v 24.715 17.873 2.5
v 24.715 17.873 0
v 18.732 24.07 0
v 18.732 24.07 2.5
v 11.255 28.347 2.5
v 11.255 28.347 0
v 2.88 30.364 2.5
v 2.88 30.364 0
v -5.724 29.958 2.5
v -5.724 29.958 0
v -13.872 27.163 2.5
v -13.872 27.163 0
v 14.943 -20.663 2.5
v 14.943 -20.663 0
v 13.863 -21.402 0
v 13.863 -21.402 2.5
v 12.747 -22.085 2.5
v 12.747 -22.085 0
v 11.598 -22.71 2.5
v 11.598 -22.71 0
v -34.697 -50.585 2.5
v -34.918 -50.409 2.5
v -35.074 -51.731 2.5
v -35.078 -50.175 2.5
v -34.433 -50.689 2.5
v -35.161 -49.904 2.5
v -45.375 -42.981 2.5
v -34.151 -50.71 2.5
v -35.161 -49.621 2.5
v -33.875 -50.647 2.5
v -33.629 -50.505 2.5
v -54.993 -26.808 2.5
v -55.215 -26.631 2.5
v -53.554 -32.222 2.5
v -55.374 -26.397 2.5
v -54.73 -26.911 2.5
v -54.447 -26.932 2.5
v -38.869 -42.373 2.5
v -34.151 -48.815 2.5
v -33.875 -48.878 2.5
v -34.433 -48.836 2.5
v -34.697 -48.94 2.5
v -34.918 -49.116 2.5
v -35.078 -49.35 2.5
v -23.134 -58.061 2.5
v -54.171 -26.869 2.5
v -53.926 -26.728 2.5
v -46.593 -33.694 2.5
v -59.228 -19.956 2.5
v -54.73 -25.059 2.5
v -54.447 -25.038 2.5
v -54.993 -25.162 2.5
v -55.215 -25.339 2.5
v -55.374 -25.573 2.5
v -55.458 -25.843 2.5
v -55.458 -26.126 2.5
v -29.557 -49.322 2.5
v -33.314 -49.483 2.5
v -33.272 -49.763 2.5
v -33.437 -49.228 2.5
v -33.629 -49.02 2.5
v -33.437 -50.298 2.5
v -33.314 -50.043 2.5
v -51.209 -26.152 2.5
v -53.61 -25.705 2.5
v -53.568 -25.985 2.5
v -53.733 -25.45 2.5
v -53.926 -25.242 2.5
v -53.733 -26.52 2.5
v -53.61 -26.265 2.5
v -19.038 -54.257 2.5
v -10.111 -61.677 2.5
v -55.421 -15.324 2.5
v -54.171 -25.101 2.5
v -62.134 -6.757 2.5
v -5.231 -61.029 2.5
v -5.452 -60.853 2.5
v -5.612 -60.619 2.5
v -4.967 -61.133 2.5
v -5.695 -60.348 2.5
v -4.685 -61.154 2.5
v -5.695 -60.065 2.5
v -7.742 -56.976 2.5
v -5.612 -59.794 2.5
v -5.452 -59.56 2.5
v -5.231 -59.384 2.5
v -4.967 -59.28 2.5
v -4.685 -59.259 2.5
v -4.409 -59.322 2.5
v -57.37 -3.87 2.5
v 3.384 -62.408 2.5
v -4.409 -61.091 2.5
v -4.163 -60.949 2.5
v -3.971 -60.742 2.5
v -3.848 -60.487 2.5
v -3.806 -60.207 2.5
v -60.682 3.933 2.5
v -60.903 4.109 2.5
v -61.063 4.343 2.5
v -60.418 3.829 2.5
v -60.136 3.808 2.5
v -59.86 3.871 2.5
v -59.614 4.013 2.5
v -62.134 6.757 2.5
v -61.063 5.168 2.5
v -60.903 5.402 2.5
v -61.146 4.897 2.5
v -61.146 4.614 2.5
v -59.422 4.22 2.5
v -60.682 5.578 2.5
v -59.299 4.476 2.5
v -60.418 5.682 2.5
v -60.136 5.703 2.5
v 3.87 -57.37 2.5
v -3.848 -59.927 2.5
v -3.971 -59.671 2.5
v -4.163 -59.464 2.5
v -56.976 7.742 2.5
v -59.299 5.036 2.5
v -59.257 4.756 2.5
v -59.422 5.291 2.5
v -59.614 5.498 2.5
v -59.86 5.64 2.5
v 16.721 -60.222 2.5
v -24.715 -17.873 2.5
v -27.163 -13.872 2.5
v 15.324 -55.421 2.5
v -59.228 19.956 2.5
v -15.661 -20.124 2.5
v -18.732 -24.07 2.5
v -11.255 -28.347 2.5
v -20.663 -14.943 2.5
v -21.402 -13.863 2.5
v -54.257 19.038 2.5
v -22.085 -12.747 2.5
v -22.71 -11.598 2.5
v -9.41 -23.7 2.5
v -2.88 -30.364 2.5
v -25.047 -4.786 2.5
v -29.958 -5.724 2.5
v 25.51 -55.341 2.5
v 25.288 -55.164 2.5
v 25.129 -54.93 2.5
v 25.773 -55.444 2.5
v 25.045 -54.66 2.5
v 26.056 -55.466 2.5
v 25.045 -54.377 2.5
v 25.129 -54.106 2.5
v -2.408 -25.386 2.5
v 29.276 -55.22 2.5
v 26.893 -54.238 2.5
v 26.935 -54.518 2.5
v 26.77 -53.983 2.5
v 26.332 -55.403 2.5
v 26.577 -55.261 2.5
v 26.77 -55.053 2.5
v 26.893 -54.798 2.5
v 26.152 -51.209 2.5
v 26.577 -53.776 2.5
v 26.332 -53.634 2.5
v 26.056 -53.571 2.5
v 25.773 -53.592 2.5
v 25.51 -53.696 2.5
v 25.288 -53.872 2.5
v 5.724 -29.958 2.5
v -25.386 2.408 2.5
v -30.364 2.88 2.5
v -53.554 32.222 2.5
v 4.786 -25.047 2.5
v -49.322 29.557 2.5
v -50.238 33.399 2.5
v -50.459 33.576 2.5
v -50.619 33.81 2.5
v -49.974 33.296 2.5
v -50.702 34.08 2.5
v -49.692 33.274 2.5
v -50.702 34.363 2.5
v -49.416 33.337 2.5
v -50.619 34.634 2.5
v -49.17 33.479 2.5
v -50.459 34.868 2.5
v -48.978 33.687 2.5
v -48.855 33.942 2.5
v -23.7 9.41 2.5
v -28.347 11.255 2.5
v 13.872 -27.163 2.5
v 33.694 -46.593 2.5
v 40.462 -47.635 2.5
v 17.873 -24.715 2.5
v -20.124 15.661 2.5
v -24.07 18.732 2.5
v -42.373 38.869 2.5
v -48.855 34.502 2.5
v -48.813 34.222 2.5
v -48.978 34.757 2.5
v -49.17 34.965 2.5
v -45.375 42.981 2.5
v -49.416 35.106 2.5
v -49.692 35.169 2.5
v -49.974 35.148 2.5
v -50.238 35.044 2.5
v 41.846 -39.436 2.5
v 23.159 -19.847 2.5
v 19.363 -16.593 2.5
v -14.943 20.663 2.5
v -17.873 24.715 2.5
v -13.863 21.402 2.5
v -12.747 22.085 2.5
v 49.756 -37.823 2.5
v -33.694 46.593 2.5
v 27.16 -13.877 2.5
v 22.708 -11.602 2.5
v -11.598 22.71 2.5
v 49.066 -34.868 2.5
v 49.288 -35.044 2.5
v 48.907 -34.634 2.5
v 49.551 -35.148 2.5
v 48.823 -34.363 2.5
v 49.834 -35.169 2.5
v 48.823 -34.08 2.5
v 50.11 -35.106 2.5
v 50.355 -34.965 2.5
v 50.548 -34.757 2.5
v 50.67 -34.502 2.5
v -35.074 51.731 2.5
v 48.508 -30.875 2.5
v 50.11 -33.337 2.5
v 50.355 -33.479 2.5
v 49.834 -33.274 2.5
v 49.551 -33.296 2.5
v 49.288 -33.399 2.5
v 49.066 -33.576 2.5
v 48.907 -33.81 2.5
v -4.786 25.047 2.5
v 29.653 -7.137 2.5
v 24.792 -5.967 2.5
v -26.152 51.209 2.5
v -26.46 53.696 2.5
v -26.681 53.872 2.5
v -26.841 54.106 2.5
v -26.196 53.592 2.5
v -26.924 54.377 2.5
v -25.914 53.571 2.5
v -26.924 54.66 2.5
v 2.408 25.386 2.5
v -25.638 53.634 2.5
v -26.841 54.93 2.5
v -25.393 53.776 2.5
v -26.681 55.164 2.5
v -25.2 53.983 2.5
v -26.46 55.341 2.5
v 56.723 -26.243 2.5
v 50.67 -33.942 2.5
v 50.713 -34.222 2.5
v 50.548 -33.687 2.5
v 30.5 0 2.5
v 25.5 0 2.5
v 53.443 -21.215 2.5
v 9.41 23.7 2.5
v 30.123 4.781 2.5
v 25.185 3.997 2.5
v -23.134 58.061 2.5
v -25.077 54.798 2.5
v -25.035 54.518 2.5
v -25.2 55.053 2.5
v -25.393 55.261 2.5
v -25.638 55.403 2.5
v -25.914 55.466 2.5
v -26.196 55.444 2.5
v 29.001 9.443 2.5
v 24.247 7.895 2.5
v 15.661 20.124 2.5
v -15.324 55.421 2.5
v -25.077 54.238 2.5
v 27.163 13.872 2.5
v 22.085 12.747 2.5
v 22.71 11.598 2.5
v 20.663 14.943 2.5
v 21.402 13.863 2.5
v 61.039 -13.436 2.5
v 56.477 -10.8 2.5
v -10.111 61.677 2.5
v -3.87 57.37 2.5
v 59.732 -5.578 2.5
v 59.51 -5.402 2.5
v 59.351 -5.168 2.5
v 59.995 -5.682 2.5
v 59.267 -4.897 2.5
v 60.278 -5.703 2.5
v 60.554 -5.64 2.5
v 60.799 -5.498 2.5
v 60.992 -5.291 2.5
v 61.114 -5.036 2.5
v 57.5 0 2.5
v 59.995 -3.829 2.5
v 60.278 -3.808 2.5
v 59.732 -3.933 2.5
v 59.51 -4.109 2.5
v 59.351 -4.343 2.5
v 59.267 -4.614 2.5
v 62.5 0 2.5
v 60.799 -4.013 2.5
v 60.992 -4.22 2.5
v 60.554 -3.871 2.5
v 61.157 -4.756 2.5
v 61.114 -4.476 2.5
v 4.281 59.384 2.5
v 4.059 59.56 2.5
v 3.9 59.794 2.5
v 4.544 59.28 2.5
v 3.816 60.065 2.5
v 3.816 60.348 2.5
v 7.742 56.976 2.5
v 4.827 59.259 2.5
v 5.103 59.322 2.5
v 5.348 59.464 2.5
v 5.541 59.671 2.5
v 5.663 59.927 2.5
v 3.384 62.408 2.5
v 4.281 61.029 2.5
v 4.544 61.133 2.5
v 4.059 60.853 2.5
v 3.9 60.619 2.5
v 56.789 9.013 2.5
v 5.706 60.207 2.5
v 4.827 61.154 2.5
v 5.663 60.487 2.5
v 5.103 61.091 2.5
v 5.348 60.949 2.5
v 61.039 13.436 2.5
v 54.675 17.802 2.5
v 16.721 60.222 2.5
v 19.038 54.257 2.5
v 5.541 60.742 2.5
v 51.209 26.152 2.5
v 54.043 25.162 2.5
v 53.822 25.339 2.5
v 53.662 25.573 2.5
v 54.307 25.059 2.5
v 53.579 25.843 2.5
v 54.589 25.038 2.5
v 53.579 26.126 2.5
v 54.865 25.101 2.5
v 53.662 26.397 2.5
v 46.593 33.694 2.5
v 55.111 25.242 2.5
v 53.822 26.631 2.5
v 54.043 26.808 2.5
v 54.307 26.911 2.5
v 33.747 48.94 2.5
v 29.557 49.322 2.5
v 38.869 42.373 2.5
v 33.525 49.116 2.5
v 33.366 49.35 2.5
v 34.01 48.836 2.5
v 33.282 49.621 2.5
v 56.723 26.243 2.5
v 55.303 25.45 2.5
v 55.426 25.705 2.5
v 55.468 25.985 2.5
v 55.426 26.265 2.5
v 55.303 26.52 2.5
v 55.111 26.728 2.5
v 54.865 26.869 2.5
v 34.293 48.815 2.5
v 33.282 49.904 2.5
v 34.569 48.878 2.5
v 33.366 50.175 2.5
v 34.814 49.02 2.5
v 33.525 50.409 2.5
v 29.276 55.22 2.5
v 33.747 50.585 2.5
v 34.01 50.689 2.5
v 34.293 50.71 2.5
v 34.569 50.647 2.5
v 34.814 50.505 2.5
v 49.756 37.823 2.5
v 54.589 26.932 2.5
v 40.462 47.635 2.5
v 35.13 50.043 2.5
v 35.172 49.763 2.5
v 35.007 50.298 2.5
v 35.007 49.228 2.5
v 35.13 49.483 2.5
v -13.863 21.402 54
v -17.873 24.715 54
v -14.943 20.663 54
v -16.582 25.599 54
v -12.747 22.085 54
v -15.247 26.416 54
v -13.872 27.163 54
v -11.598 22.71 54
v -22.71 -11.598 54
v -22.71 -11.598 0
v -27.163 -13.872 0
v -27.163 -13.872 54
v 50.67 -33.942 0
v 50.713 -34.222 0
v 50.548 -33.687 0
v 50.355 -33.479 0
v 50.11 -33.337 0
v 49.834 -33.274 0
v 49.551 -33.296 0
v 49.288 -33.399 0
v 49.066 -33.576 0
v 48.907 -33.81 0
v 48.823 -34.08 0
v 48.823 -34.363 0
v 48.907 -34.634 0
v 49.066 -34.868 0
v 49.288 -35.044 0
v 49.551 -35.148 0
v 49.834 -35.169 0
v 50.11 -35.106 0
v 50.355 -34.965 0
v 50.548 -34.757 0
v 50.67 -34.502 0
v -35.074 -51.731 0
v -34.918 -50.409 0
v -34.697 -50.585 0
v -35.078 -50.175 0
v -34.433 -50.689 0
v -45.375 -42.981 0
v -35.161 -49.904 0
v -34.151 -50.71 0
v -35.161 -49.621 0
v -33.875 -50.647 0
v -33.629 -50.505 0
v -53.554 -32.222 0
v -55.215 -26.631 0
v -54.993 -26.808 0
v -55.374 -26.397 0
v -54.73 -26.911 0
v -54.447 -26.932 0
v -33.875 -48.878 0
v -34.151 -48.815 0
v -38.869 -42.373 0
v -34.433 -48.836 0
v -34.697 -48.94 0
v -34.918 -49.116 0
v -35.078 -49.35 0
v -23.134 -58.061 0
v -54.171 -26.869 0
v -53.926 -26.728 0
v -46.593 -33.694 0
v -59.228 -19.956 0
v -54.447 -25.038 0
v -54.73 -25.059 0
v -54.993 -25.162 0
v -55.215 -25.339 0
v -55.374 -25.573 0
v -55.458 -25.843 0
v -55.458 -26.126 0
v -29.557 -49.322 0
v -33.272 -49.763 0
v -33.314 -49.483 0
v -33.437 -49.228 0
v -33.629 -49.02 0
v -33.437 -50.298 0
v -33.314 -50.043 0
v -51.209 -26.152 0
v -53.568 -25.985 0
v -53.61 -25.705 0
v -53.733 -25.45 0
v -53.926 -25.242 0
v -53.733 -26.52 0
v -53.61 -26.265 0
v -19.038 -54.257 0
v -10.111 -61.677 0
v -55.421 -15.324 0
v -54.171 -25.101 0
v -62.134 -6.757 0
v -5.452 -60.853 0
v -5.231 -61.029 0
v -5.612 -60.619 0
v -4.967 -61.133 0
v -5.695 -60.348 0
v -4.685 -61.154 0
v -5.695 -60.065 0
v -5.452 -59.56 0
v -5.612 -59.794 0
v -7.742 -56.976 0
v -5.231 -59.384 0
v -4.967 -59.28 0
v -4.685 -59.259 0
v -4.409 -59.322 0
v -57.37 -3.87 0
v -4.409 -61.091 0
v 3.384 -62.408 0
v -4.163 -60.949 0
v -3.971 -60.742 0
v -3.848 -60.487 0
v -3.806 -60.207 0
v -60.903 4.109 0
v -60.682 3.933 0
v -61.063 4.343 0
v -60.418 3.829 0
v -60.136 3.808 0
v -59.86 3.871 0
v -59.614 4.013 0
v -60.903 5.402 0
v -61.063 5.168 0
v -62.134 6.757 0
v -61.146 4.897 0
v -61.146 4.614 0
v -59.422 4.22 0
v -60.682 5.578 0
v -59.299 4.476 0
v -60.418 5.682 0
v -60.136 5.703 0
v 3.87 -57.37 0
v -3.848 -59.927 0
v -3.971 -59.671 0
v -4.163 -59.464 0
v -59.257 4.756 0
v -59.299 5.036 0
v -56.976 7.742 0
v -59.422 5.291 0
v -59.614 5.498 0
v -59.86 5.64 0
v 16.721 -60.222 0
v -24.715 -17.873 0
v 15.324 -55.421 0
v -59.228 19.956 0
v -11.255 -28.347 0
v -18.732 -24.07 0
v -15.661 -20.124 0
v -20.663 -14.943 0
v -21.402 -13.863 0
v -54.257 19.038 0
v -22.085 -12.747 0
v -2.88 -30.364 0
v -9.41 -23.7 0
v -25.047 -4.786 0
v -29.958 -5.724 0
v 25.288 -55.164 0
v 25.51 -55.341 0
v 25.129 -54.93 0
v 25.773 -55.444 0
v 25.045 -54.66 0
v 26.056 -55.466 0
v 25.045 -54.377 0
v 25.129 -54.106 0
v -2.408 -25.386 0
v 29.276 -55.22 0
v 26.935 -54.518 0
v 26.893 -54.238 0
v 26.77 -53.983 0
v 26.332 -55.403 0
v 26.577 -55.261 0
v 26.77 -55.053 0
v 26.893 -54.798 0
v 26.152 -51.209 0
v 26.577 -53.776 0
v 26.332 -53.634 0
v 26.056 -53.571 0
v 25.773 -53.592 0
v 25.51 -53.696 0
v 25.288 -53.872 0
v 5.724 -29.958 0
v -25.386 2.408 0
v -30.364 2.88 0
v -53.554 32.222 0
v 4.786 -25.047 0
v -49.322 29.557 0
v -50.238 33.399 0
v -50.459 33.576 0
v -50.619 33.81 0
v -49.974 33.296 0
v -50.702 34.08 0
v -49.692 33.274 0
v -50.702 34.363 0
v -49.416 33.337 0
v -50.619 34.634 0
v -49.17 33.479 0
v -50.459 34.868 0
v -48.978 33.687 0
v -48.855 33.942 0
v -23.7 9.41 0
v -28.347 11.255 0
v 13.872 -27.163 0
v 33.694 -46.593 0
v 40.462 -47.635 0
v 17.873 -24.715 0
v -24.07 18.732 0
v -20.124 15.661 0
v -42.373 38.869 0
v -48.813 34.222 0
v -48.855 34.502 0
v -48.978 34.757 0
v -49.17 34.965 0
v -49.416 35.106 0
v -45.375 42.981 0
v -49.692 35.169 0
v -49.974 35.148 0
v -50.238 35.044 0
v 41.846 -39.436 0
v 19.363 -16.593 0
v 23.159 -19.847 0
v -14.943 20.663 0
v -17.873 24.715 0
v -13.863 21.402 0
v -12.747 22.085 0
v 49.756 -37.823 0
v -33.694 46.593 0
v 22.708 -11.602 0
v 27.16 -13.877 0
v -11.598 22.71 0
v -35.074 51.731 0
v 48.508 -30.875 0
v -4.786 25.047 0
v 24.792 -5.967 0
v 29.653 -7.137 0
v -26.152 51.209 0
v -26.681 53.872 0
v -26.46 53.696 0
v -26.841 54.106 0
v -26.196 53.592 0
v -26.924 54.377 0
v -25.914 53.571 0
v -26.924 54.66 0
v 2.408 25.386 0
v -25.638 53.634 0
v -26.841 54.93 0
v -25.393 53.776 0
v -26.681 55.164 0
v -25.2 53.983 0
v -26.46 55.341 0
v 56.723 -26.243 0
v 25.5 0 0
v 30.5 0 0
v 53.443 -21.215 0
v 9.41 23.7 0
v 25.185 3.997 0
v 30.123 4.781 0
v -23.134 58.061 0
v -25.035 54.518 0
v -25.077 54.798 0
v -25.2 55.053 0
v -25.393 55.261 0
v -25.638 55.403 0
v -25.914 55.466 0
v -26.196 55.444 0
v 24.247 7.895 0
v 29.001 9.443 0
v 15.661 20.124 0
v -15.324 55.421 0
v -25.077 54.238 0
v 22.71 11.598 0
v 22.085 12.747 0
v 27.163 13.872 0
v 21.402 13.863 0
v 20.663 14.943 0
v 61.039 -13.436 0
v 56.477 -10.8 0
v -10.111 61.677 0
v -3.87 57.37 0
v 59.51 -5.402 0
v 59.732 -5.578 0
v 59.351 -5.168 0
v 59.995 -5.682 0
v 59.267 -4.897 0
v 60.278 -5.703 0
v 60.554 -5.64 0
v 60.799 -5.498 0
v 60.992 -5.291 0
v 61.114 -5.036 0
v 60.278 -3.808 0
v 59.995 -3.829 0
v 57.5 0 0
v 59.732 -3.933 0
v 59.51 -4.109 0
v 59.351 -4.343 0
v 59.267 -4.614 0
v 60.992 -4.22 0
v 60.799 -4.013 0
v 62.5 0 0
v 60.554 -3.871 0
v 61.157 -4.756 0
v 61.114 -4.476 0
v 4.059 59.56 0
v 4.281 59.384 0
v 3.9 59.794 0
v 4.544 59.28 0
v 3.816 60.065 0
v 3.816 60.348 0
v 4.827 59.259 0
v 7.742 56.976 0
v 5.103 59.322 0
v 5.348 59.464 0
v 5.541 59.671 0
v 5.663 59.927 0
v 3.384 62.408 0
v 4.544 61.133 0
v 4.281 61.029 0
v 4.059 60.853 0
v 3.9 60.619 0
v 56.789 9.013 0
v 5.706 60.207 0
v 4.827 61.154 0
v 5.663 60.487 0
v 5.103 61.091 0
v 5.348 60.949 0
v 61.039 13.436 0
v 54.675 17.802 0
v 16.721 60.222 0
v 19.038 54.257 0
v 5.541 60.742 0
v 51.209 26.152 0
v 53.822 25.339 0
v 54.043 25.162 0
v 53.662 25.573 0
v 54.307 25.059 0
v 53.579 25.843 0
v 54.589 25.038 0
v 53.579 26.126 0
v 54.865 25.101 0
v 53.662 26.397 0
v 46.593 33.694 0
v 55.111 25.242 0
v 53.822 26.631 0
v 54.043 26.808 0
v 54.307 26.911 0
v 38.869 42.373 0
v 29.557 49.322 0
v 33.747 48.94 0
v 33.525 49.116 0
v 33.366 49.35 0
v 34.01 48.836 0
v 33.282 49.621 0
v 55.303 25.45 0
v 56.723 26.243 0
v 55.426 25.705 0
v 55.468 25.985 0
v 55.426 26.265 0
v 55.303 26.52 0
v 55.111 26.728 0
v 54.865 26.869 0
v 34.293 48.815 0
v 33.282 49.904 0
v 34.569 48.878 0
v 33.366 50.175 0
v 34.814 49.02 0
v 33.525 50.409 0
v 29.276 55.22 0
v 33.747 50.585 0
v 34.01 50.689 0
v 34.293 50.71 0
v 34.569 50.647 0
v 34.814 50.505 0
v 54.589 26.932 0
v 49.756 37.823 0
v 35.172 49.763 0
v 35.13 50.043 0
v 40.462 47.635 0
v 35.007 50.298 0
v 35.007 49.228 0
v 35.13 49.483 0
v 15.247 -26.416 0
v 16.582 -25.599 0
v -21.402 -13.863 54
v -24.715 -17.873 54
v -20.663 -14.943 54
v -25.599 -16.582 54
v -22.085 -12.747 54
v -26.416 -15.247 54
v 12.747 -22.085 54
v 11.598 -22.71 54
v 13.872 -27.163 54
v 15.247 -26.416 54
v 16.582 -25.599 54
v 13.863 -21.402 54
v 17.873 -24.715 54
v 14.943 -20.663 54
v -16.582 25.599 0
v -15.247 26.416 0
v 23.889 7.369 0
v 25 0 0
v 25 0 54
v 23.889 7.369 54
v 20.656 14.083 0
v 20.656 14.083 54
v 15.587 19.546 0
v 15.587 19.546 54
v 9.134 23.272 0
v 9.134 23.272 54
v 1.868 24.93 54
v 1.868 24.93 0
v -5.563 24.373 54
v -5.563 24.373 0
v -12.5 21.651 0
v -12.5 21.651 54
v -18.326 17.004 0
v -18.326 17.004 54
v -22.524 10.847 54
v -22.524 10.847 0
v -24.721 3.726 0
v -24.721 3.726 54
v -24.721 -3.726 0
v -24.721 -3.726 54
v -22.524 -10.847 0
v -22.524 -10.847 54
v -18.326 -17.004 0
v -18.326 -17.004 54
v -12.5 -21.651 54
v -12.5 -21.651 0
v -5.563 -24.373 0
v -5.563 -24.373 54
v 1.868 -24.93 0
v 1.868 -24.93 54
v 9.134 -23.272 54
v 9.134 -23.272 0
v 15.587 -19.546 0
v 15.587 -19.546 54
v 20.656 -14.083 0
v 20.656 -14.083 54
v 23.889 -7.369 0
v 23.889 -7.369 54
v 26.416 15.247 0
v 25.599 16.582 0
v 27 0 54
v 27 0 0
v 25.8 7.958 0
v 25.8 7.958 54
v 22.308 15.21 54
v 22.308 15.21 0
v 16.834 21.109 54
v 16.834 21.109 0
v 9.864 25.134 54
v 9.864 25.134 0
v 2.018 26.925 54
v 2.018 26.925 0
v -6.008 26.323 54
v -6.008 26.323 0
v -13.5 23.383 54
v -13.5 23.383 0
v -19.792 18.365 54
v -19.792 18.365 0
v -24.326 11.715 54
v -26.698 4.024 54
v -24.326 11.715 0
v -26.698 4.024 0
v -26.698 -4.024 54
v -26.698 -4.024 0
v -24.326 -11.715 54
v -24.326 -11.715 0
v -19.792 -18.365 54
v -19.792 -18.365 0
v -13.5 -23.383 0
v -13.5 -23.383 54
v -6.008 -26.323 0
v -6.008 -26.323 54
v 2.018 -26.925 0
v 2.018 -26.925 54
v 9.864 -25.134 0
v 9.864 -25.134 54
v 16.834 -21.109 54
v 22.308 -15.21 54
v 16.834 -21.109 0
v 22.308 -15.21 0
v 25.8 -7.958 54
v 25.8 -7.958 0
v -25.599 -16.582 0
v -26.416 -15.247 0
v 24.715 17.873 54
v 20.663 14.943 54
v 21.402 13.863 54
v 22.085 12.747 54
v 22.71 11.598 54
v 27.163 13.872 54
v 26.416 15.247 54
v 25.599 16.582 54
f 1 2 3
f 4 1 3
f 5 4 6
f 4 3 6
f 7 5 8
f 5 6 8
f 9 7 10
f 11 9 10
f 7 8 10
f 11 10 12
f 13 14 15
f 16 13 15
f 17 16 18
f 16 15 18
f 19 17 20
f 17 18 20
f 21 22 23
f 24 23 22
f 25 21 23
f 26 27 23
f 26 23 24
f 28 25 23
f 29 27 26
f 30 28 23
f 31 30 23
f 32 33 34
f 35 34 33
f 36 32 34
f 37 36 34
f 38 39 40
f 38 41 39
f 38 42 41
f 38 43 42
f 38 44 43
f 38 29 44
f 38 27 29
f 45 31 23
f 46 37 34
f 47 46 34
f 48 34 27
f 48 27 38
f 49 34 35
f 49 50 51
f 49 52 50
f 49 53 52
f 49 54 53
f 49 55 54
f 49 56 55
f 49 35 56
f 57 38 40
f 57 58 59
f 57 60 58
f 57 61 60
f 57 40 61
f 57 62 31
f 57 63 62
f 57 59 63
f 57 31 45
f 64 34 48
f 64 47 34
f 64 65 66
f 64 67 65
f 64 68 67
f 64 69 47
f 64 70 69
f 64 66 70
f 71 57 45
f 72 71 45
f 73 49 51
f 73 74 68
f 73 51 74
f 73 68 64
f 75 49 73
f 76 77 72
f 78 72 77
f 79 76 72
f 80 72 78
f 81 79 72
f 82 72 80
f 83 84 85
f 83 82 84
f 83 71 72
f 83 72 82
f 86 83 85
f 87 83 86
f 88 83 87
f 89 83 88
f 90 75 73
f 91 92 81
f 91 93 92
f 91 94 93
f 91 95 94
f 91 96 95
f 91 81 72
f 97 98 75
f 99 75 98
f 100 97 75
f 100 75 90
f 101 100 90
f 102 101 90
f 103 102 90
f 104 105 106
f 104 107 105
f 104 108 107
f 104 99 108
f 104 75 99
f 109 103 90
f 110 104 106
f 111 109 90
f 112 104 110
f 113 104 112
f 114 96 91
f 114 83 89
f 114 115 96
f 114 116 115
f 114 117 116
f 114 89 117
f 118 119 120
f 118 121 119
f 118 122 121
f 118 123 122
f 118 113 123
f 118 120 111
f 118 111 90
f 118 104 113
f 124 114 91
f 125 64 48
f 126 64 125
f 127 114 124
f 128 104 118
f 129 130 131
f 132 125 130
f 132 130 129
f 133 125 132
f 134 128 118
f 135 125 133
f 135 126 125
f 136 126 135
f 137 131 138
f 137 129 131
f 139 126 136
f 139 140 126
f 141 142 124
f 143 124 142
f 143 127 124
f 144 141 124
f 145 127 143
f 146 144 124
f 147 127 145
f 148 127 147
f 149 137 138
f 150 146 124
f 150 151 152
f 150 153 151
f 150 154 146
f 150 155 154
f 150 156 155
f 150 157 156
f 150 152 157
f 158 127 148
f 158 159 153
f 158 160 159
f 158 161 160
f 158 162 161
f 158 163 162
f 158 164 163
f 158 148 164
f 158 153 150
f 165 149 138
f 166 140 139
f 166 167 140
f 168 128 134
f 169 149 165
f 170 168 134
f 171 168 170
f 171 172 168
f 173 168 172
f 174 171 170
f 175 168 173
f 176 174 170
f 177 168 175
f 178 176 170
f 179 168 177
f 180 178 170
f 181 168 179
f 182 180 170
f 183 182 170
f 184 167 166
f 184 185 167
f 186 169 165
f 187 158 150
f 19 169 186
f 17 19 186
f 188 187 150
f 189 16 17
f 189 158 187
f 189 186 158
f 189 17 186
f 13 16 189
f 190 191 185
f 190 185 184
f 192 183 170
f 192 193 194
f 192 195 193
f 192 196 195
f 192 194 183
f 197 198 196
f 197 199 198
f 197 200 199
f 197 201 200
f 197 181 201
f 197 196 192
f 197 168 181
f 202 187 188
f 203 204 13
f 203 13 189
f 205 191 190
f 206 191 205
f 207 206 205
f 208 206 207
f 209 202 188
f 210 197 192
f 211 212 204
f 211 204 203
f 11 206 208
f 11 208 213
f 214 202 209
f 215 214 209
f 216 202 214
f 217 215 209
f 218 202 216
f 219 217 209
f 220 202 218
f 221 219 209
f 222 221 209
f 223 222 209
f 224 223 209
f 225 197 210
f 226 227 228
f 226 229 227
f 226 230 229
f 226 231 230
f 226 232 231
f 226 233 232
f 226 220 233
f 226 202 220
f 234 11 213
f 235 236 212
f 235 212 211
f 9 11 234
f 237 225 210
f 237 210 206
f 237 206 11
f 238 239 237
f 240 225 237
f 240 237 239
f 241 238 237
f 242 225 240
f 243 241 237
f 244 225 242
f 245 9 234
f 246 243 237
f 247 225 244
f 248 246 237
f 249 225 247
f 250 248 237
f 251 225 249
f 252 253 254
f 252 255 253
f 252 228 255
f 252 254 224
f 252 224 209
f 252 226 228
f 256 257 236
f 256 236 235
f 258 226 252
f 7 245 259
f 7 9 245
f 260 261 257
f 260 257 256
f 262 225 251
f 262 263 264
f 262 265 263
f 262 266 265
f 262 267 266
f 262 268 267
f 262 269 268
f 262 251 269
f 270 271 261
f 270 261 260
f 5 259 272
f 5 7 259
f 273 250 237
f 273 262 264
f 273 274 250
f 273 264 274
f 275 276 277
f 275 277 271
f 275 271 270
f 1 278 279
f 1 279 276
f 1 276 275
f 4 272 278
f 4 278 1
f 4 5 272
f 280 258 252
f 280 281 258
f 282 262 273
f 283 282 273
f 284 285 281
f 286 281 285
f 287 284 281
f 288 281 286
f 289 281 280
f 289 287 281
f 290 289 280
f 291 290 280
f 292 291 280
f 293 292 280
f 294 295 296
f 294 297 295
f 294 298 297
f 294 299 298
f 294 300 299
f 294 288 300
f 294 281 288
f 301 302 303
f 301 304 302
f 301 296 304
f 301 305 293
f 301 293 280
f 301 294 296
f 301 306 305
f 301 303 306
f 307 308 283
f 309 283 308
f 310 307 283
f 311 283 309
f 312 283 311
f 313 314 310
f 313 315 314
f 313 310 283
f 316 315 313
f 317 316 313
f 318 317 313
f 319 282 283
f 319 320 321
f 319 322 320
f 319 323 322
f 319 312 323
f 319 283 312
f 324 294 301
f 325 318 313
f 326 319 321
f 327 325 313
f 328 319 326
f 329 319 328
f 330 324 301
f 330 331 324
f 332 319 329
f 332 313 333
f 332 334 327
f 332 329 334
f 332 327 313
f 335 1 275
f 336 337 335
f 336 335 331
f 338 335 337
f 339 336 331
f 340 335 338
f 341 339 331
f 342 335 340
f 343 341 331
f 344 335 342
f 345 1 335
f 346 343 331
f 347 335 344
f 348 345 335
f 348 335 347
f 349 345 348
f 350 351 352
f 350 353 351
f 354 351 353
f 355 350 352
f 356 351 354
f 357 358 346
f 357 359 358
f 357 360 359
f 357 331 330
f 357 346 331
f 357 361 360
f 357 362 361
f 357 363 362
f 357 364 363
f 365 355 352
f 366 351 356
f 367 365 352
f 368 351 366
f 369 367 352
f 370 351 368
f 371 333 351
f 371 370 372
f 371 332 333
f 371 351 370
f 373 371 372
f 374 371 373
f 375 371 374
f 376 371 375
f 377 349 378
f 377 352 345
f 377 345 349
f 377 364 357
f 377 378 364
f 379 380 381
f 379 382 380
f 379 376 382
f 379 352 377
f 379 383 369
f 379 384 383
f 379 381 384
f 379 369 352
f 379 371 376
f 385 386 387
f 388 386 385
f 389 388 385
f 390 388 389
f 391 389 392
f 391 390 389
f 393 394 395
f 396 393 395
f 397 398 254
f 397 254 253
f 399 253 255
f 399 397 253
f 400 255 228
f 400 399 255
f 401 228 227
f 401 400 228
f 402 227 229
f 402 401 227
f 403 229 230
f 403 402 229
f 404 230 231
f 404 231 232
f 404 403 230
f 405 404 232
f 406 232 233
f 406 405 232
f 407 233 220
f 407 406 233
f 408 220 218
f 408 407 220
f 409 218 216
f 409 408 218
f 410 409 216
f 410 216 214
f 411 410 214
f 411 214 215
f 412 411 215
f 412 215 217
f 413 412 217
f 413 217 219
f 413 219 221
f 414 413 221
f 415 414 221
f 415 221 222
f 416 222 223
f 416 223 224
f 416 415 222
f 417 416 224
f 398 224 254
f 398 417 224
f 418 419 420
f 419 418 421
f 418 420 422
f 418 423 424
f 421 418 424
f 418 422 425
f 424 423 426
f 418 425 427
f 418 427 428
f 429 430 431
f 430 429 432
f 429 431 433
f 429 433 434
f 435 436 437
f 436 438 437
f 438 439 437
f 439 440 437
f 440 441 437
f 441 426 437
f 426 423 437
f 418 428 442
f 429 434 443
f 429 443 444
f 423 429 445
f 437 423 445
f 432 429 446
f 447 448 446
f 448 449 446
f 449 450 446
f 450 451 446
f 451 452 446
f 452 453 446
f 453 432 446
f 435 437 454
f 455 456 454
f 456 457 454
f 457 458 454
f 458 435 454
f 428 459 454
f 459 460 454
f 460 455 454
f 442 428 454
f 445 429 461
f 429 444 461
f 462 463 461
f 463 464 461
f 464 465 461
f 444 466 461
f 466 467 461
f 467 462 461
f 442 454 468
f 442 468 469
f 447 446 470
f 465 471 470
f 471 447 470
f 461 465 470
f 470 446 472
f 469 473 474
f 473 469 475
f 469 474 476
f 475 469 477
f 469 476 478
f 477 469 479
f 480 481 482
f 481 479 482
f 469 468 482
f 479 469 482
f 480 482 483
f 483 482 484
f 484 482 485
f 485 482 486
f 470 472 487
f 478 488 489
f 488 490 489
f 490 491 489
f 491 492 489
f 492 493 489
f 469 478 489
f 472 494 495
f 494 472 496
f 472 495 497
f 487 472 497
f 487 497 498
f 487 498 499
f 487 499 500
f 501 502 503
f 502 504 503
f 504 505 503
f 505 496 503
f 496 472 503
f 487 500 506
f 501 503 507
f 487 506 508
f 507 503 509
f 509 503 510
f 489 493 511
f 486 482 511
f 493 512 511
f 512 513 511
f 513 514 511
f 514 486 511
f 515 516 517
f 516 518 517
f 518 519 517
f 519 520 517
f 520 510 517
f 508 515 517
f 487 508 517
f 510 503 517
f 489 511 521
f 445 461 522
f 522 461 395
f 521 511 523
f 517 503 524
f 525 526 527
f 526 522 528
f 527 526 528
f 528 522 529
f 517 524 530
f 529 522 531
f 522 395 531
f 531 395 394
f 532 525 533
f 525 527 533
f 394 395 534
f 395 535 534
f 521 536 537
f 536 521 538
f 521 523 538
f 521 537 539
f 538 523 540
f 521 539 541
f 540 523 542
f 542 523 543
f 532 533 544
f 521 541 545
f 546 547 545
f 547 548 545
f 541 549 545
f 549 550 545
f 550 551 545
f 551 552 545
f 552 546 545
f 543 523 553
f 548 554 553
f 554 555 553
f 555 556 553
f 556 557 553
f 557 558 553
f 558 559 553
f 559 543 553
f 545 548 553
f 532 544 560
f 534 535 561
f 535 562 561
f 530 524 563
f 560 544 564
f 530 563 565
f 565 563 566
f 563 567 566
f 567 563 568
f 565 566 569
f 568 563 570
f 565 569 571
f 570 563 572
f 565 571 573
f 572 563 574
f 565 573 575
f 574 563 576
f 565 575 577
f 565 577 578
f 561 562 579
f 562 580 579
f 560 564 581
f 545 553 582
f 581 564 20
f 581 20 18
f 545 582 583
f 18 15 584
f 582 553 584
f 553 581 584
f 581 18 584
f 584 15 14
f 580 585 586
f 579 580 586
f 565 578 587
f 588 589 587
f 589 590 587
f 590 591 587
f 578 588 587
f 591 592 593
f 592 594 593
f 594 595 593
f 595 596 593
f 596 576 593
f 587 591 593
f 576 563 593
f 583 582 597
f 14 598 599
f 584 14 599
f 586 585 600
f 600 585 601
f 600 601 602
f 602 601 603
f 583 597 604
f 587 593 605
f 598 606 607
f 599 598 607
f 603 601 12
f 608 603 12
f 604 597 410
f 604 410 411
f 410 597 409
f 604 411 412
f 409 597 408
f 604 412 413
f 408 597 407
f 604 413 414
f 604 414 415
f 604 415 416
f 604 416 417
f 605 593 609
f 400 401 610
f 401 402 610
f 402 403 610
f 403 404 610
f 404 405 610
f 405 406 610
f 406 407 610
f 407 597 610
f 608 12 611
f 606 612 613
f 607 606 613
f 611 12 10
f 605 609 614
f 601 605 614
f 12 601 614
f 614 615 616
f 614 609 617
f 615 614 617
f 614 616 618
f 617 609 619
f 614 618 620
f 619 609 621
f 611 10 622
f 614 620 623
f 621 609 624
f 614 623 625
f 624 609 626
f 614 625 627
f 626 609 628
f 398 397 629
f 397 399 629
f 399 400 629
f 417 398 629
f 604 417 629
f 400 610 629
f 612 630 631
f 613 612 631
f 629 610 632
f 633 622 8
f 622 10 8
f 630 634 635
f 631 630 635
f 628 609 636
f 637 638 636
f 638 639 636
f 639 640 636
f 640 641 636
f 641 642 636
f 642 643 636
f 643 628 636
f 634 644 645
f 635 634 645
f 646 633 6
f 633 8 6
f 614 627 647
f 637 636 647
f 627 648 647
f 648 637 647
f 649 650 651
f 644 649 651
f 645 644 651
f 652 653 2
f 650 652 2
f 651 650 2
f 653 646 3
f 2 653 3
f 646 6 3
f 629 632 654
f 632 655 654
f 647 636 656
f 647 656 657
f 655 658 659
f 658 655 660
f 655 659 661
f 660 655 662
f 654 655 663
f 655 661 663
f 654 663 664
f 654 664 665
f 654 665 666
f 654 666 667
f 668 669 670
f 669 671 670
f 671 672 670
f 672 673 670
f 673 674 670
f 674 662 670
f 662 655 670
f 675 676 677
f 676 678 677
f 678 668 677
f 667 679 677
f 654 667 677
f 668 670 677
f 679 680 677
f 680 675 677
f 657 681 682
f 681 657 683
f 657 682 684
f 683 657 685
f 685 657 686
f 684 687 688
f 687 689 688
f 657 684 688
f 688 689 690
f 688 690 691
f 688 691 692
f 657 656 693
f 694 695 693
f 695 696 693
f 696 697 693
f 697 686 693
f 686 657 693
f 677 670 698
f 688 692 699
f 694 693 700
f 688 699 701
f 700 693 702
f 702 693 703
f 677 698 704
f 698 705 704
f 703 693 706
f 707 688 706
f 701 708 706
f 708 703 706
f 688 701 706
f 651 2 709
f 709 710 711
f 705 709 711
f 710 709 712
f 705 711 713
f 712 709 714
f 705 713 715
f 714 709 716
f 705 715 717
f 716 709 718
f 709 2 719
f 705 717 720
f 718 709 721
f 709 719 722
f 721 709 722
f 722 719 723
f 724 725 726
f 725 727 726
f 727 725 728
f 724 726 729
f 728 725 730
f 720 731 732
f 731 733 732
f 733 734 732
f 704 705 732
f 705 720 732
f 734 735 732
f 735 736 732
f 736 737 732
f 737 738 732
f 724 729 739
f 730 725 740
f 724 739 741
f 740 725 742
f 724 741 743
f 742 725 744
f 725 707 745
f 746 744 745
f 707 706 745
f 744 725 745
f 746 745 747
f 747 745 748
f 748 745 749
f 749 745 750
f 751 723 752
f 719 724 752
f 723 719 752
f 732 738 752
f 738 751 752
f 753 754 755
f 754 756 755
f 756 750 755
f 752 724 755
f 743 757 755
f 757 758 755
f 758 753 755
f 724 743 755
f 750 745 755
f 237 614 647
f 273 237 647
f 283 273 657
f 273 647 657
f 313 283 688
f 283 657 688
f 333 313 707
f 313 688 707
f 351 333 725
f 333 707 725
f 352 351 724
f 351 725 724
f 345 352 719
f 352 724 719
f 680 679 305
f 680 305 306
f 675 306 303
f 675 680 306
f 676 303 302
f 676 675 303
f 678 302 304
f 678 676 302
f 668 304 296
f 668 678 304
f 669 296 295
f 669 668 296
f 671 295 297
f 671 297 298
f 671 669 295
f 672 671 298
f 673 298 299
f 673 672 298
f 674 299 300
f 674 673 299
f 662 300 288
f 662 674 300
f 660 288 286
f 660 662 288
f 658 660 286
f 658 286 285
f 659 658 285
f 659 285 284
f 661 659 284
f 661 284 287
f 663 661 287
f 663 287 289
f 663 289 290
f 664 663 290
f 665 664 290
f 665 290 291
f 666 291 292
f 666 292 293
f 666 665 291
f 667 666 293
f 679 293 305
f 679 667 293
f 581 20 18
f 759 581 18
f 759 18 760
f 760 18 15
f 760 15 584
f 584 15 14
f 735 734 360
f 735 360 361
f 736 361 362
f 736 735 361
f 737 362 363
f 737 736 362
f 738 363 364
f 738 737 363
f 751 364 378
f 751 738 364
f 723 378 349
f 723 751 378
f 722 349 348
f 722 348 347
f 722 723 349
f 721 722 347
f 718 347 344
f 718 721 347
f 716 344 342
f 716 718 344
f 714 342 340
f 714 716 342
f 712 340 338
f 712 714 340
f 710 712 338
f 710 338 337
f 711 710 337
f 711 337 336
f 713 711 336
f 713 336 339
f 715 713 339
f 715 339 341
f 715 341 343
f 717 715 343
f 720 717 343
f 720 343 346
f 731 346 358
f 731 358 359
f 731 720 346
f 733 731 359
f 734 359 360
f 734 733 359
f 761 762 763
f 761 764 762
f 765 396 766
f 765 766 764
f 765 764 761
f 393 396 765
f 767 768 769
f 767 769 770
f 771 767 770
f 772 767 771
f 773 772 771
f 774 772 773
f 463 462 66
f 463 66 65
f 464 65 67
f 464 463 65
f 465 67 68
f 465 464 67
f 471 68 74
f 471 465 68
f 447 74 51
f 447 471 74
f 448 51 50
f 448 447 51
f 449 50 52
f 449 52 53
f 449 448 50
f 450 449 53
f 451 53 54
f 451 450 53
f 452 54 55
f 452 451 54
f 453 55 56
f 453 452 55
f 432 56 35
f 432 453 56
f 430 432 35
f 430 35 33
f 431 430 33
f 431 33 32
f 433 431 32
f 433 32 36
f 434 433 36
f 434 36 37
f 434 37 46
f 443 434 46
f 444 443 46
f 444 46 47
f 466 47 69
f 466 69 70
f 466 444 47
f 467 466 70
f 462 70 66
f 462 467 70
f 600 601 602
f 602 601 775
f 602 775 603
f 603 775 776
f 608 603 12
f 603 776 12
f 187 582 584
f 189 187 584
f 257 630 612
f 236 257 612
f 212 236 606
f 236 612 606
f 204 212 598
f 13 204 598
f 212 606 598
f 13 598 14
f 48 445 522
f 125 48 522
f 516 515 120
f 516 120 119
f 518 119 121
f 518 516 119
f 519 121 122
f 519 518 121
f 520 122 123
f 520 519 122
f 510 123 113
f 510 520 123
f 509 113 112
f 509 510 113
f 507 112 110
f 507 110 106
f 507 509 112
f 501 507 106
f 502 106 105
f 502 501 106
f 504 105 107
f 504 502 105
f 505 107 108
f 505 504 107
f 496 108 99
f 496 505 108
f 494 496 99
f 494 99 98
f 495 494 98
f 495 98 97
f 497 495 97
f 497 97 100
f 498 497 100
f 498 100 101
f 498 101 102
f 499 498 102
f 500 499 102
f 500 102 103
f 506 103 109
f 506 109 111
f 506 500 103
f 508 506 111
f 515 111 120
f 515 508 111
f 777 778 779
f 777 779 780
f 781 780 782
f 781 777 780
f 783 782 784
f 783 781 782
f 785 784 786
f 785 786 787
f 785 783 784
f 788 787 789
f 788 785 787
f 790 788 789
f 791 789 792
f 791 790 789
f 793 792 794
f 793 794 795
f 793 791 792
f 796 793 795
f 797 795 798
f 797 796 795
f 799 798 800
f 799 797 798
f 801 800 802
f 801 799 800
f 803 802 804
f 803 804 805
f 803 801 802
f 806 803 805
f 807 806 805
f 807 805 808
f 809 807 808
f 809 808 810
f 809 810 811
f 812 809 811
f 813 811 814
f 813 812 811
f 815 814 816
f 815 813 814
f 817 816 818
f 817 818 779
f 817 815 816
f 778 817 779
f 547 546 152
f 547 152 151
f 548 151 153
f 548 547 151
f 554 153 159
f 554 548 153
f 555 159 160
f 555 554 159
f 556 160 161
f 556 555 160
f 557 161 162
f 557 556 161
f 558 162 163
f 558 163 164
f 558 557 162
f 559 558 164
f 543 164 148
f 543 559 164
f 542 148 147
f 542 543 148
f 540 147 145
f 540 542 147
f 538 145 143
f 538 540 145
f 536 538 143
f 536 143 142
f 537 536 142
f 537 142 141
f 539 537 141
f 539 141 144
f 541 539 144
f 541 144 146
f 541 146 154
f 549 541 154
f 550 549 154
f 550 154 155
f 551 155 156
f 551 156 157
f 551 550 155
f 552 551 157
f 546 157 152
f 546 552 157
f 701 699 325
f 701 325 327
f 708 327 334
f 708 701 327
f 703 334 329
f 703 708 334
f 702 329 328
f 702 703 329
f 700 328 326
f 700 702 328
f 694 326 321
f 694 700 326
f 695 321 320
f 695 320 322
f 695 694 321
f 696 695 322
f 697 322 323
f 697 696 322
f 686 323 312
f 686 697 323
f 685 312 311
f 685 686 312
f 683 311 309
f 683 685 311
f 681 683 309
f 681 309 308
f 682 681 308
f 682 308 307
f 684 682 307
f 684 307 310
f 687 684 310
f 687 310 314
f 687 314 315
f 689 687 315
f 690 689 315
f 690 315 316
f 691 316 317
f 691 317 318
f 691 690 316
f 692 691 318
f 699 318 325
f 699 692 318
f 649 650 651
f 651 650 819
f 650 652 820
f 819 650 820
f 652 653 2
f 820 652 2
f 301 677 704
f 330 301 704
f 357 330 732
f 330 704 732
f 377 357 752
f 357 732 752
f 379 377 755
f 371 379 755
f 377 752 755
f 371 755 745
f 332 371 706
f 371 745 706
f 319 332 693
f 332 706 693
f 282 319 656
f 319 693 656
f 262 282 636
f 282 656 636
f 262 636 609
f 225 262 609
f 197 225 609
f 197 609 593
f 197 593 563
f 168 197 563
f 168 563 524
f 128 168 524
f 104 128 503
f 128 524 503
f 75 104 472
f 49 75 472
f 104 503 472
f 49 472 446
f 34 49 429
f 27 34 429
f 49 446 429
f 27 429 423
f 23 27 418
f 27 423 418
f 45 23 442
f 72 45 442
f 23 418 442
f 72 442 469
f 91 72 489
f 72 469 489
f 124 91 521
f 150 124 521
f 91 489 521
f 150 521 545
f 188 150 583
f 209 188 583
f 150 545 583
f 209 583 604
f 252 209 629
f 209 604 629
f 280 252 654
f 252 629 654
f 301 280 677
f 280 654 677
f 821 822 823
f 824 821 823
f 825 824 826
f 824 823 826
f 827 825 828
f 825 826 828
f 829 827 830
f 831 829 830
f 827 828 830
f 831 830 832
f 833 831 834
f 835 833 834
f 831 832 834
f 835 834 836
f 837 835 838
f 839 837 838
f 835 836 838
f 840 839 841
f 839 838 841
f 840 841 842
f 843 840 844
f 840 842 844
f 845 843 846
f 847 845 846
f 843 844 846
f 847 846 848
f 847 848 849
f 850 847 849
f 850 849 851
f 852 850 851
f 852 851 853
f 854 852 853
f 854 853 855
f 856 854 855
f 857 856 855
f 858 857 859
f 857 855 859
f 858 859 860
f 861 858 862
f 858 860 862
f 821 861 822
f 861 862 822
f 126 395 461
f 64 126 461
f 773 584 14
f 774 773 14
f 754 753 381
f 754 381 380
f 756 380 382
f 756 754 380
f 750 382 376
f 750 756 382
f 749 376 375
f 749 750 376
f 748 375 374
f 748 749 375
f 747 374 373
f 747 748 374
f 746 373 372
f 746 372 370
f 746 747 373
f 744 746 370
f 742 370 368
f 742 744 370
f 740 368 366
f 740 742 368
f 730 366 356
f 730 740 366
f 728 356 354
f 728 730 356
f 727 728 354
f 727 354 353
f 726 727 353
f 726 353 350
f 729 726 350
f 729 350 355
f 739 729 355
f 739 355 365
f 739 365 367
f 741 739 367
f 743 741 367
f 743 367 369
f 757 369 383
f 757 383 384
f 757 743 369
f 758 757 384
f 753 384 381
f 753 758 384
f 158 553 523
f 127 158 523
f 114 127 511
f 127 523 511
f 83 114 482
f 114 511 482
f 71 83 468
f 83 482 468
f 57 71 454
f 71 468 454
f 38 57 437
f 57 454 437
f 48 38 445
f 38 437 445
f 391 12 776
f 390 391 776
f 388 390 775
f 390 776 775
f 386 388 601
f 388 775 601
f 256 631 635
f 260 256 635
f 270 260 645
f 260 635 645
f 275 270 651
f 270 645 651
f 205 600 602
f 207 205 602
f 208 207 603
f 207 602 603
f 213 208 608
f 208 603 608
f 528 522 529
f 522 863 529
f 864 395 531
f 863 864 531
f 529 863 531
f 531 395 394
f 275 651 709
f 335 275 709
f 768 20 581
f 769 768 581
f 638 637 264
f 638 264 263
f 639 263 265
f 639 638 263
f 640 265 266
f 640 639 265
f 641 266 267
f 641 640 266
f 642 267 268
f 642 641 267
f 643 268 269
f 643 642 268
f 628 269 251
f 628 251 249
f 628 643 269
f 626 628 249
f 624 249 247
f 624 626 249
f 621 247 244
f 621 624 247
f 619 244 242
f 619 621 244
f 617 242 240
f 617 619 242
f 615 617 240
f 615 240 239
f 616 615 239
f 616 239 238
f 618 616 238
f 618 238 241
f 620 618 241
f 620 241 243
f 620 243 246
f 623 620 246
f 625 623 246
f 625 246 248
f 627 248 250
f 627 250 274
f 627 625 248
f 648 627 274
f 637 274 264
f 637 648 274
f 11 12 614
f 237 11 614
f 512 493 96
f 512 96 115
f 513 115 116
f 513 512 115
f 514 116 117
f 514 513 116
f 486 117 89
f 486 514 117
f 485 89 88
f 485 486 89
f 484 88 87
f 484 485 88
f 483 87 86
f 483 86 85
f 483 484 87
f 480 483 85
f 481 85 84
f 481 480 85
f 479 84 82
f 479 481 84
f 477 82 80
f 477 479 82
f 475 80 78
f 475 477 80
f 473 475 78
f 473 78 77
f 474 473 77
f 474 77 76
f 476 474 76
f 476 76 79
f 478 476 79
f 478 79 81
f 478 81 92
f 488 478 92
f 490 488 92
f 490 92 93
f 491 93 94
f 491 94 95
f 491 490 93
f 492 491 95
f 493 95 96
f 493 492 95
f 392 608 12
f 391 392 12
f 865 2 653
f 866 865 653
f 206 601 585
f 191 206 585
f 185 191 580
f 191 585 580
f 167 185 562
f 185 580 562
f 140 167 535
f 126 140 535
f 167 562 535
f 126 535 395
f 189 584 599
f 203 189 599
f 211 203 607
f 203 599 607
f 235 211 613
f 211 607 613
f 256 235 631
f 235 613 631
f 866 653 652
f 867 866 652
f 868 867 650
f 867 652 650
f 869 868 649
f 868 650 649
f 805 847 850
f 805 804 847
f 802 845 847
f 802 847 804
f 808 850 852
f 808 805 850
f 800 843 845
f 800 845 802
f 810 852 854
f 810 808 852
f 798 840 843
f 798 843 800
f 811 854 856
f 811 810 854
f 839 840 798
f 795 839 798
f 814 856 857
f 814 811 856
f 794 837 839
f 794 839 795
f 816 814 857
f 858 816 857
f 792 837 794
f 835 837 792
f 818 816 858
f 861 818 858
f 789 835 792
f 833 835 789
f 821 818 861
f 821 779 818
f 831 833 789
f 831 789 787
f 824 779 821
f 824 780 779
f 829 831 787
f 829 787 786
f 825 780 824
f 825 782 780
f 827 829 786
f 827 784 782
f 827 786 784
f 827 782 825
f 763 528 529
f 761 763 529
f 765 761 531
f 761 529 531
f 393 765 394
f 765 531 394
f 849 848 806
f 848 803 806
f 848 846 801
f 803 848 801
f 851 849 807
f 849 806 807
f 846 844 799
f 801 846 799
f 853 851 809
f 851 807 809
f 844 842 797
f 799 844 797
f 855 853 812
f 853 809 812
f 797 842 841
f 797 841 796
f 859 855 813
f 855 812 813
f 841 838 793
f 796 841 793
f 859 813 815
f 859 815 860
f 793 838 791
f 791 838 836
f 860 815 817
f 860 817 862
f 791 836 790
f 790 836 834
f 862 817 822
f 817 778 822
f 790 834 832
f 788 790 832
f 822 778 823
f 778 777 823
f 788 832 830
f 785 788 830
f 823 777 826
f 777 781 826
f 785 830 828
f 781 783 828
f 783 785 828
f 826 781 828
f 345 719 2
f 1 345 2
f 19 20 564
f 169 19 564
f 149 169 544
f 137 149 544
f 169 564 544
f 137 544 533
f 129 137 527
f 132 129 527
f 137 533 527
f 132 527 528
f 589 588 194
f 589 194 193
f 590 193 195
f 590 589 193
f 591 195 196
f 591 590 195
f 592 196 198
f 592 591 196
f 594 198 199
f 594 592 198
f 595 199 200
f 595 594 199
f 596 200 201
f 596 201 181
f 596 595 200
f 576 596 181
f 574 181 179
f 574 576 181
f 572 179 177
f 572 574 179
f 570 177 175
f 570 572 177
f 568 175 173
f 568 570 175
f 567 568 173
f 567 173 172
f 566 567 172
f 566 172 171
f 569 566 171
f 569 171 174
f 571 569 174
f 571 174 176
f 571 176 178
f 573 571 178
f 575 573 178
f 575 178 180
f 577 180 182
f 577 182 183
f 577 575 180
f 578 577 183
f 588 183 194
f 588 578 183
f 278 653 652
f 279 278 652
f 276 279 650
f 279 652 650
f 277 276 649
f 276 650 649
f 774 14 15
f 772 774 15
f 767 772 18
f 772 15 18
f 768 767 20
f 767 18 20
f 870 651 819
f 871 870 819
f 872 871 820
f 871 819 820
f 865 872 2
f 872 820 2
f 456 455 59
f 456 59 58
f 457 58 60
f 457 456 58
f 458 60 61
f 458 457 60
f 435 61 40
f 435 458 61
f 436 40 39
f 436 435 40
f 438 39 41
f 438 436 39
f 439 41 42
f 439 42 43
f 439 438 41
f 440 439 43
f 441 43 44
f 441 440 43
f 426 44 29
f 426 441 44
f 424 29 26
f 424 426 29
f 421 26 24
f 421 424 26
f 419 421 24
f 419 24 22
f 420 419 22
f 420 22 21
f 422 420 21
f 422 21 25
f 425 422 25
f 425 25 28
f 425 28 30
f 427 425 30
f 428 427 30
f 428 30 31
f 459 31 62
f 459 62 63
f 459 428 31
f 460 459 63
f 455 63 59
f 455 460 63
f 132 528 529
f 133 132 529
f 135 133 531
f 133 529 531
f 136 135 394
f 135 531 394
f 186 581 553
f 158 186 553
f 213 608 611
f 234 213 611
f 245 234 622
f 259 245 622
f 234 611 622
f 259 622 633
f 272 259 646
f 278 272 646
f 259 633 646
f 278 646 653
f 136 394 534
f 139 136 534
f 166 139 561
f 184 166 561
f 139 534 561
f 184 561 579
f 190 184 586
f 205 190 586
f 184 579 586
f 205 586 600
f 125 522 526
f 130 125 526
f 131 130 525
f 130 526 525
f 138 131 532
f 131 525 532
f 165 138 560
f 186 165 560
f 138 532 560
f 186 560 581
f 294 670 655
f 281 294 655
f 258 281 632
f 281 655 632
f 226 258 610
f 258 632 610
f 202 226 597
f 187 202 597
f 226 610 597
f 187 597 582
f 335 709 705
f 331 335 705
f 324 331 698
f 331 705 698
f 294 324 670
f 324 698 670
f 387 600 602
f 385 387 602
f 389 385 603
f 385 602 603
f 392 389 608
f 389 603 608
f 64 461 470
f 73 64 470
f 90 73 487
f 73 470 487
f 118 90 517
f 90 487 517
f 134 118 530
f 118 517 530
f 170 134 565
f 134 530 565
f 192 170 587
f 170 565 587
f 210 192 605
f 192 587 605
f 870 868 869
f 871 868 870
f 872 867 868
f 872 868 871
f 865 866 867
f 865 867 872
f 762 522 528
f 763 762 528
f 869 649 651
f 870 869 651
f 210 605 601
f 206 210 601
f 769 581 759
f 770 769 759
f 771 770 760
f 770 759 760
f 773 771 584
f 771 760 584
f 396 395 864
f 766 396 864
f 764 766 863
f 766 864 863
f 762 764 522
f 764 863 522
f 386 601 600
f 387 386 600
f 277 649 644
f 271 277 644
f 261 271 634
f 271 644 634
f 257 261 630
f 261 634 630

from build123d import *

# Parameters (mm, degrees)
F0_R     = 62.5
F0_R_2   = 0.95
F1_DEPTH = 2.5
F2_DEPTH = 54
F3_R     = 27
F3_R_2   = 25
F4_DEPTH = 54


with BuildPart() as f1:
    # F0 (on Top) → F1 (new body)
    with BuildSketch(Plane.XY):
        Circle(F0_R)
        with Locations((-34.2217646539, -49.7626625001)):
            Circle(F0_R_2, mode=Mode.SUBTRACT)
        with Locations((-4.7555863026, -60.206612212)):
            Circle(F0_R_2, mode=Mode.SUBTRACT)
        with Locations((-54.5182488027, -25.9848475581)):
            Circle(F0_R_2, mode=Mode.SUBTRACT)
        with Locations((25.9848475581, -54.5182488027)):
            Circle(F0_R_2, mode=Mode.SUBTRACT)
        with Locations((49.7626625001, -34.2217646539)):
            Circle(F0_R_2, mode=Mode.SUBTRACT)
        with Locations((60.206612212, -4.7555863026)):
            Circle(F0_R_2, mode=Mode.SUBTRACT)
        with Locations((-60.206612212, 4.7555863026)):
            Circle(F0_R_2, mode=Mode.SUBTRACT)
        with Locations((-49.7626625001, 34.2217646539)):
            Circle(F0_R_2, mode=Mode.SUBTRACT)
        with Locations((-25.9848475581, 54.5182488027)):
            Circle(F0_R_2, mode=Mode.SUBTRACT)
        with BuildLine():
            ThreePointArc((46.5934430221, 33.6942289918), (49.0462021275, 30.0119985484), (51.2085802984, 26.1520802962))
            ThreePointArc((51.2085802984, 26.1520802962), (55.9050237777, 13.4491009521), (57.5, 0))
            ThreePointArc((57.5, 0), (51.2038483272, -26.161343935), (33.6942289918, -46.5934430221))
            ThreePointArc((33.6942289918, -46.5934430221), (30.0119985484, -49.0462021275), (26.1520802962, -51.2085802984))
            ThreePointArc((26.1520802962, -51.2085802984), (-13.4592144253, -55.9025898063), (-46.5934430221, -33.6942289918))
            ThreePointArc((-46.5934430221, -33.6942289918), (-49.0462021275, -30.0119985484), (-51.2085802984, -26.1520802962))
            ThreePointArc((-51.2085802984, -26.1520802962), (-55.9025898063, 13.4592144253), (-33.6942289918, 46.5934430221))
            ThreePointArc((-33.6942289918, 46.5934430221), (-30.0119985484, 49.0462021275), (-26.1520802962, 51.2085802984))
            ThreePointArc((-26.1520802962, 51.2085802984), (13.4592144253, 55.9025898063), (46.5934430221, 33.6942289918))
        make_face(mode=Mode.SUBTRACT)
        with Locations((54.5182488027, 25.9848475581)):
            Circle(F0_R_2, mode=Mode.SUBTRACT)
        with Locations((4.7555863026, 60.206612212)):
            Circle(F0_R_2, mode=Mode.SUBTRACT)
        with Locations((34.2217646539, 49.7626625001)):
            Circle(F0_R_2, mode=Mode.SUBTRACT)
        with BuildLine():
            ThreePointArc((-17.8725910304, 24.7147828204), (-15.9194079257, 26.0158115633), (-13.8719730267, 27.1628121583))
            Line((-13.8719730267, 27.1628121583), (-26.1520802962, 51.2085802984))
            ThreePointArc((-26.1520802962, 51.2085802984), (-30.0119985484, 49.0462021275), (-33.6942289918, 46.5934430221))
            Line((-33.6942289918, 46.5934430221), (-17.8725910304, 24.7147828204))
        make_face()
        with BuildLine():
            ThreePointArc((24.7147828204, 17.8725910304), (26.0158115633, 15.9194079257), (27.1628121583, 13.8719730267))
            Line((27.1628121583, 13.8719730267), (51.2085802984, 26.1520802962))
            ThreePointArc((51.2085802984, 26.1520802962), (49.0462021275, 30.0119985484), (46.5934430221, 33.6942289918))
            Line((46.5934430221, 33.6942289918), (24.7147828204, 17.8725910304))
        make_face()
        with BuildLine():
            Line((-46.5934430221, -33.6942289918), (-24.7147828204, -17.8725910304))
            ThreePointArc((-24.7147828204, -17.8725910304), (-26.0158115633, -15.9194079257), (-27.1628121583, -13.8719730267))
            Line((-27.1628121583, -13.8719730267), (-51.2085802984, -26.1520802962))
            ThreePointArc((-51.2085802984, -26.1520802962), (-49.0462021275, -30.0119985484), (-46.5934430221, -33.6942289918))
        make_face()
        with BuildLine():
            Line((33.6942289918, -46.5934430221), (17.8725910304, -24.7147828204))
            ThreePointArc((17.8725910304, -24.7147828204), (15.9194079257, -26.0158115633), (13.8719730267, -27.1628121583))
            Line((13.8719730267, -27.1628121583), (26.1520802962, -51.2085802984))
            ThreePointArc((26.1520802962, -51.2085802984), (30.0119985484, -49.0462021275), (33.6942289918, -46.5934430221))
        make_face()
        with BuildLine():
            Line((-24.7147828204, -17.8725910304), (-20.6631790793, -14.9426580746))
            ThreePointArc((-20.6631790793, -14.9426580746), (-21.7509244218, -13.3096689215), (-22.7098921323, -11.5978790879))
            Line((-22.7098921323, -11.5978790879), (-27.1628121583, -13.8719730267))
            ThreePointArc((-27.1628121583, -13.8719730267), (-26.0158115633, -15.9194079257), (-24.7147828204, -17.8725910304))
        make_face()
        with BuildLine():
            ThreePointArc((-22.7098921323, -11.5978790879), (-24.7915833054, 5.968869006), (-14.9426580746, 20.6631790793))
            Line((-14.9426580746, 20.6631790793), (-17.8725910304, 24.7147828204))
            ThreePointArc((-17.8725910304, 24.7147828204), (-29.6526780712, 7.1392354778), (-27.1628121583, -13.8719730267))
            Line((-27.1628121583, -13.8719730267), (-22.7098921323, -11.5978790879))
        make_face()
        with BuildLine():
            ThreePointArc((22.7098921323, 11.5978790879), (24.7926627188, 5.9643839005), (25.5, 0))
            ThreePointArc((25.5, 0), (22.707793606, -11.6019873103), (14.9426580746, -20.6631790793))
            Line((14.9426580746, -20.6631790793), (17.8725910304, -24.7147828204))
            ThreePointArc((17.8725910304, -24.7147828204), (27.1603021562, -13.8768867829), (30.5, 0))
            ThreePointArc((30.5, 0), (29.6539691342, 7.1338709398), (27.1628121583, 13.8719730267))
            Line((27.1628121583, 13.8719730267), (22.7098921323, 11.5978790879))
        make_face()
        with BuildLine():
            Line((17.8725910304, -24.7147828204), (14.9426580746, -20.6631790793))
            ThreePointArc((14.9426580746, -20.6631790793), (13.3096689215, -21.7509244218), (11.5978790879, -22.7098921323))
            Line((11.5978790879, -22.7098921323), (13.8719730267, -27.1628121583))
            ThreePointArc((13.8719730267, -27.1628121583), (15.9194079257, -26.0158115633), (17.8725910304, -24.7147828204))
        make_face()
        with BuildLine():
            ThreePointArc((20.6631790793, 14.9426580746), (21.7509244218, 13.3096689215), (22.7098921323, 11.5978790879))
            Line((22.7098921323, 11.5978790879), (27.1628121583, 13.8719730267))
            ThreePointArc((27.1628121583, 13.8719730267), (26.0158115633, 15.9194079257), (24.7147828204, 17.8725910304))
            Line((24.7147828204, 17.8725910304), (20.6631790793, 14.9426580746))
        make_face()
        with BuildLine():
            ThreePointArc((-11.5978790879, 22.7098921323), (5.968869006, 24.7915833054), (20.6631790793, 14.9426580746))
            Line((20.6631790793, 14.9426580746), (24.7147828204, 17.8725910304))
            ThreePointArc((24.7147828204, 17.8725910304), (7.1392354778, 29.6526780712), (-13.8719730267, 27.1628121583))
            Line((-13.8719730267, 27.1628121583), (-11.5978790879, 22.7098921323))
        make_face()
        with BuildLine():
            ThreePointArc((-14.9426580746, 20.6631790793), (-13.3096689215, 21.7509244218), (-11.5978790879, 22.7098921323))
            Line((-11.5978790879, 22.7098921323), (-13.8719730267, 27.1628121583))
            ThreePointArc((-13.8719730267, 27.1628121583), (-15.9194079257, 26.0158115633), (-17.8725910304, 24.7147828204))
            Line((-17.8725910304, 24.7147828204), (-14.9426580746, 20.6631790793))
        make_face()
        with BuildLine():
            Line((13.8719730267, -27.1628121583), (11.5978790879, -22.7098921323))
            ThreePointArc((11.5978790879, -22.7098921323), (-5.968869006, -24.7915833054), (-20.6631790793, -14.9426580746))
            Line((-20.6631790793, -14.9426580746), (-24.7147828204, -17.8725910304))
            ThreePointArc((-24.7147828204, -17.8725910304), (-7.1392354778, -29.6526780712), (13.8719730267, -27.1628121583))
        make_face()
    extrude(amount=F1_DEPTH)


with BuildPart() as f2:
    # F0 (on Top) → F2 (new body)
    with BuildSketch(Plane.XY):
        with BuildLine():
            ThreePointArc((-14.9426580746, 20.6631790793), (-13.3096689215, 21.7509244218), (-11.5978790879, 22.7098921323))
            Line((-11.5978790879, 22.7098921323), (-13.8719730267, 27.1628121583))
            ThreePointArc((-13.8719730267, 27.1628121583), (-15.9194079257, 26.0158115633), (-17.8725910304, 24.7147828204))
            Line((-17.8725910304, 24.7147828204), (-14.9426580746, 20.6631790793))
        make_face()
    extrude(amount=F2_DEPTH)


with BuildPart() as f2b:
    # F0 (on Top) → F2, piece 2 (new body)
    with BuildSketch(Plane.XY):
        with BuildLine():
            ThreePointArc((20.6631790793, 14.9426580746), (21.7509244218, 13.3096689215), (22.7098921323, 11.5978790879))
            Line((22.7098921323, 11.5978790879), (27.1628121583, 13.8719730267))
            ThreePointArc((27.1628121583, 13.8719730267), (26.0158115633, 15.9194079257), (24.7147828204, 17.8725910304))
            Line((24.7147828204, 17.8725910304), (20.6631790793, 14.9426580746))
        make_face()
    extrude(amount=F2_DEPTH)


with BuildPart() as f2c:
    # F0 (on Top) → F2, piece 3 (new body)
    with BuildSketch(Plane.XY):
        with BuildLine():
            Line((-24.7147828204, -17.8725910304), (-20.6631790793, -14.9426580746))
            ThreePointArc((-20.6631790793, -14.9426580746), (-21.7509244218, -13.3096689215), (-22.7098921323, -11.5978790879))
            Line((-22.7098921323, -11.5978790879), (-27.1628121583, -13.8719730267))
            ThreePointArc((-27.1628121583, -13.8719730267), (-26.0158115633, -15.9194079257), (-24.7147828204, -17.8725910304))
        make_face()
    extrude(amount=F2_DEPTH)


with BuildPart() as f2d:
    # F0 (on Top) → F2, piece 4 (new body)
    with BuildSketch(Plane.XY):
        with BuildLine():
            Line((17.8725910304, -24.7147828204), (14.9426580746, -20.6631790793))
            ThreePointArc((14.9426580746, -20.6631790793), (13.3096689215, -21.7509244218), (11.5978790879, -22.7098921323))
            Line((11.5978790879, -22.7098921323), (13.8719730267, -27.1628121583))
            ThreePointArc((13.8719730267, -27.1628121583), (15.9194079257, -26.0158115633), (17.8725910304, -24.7147828204))
        make_face()
    extrude(amount=F2_DEPTH)


with BuildPart() as f4:
    # F3 (on face) → F4 (new body)
    with BuildSketch(Plane.XY):
        Circle(F3_R)
        Circle(F3_R_2, mode=Mode.SUBTRACT)
    extrude(amount=F4_DEPTH)


solid = Compound([f1.part, f2.part, f2b.part, f2c.part, f2d.part, f4.part])
